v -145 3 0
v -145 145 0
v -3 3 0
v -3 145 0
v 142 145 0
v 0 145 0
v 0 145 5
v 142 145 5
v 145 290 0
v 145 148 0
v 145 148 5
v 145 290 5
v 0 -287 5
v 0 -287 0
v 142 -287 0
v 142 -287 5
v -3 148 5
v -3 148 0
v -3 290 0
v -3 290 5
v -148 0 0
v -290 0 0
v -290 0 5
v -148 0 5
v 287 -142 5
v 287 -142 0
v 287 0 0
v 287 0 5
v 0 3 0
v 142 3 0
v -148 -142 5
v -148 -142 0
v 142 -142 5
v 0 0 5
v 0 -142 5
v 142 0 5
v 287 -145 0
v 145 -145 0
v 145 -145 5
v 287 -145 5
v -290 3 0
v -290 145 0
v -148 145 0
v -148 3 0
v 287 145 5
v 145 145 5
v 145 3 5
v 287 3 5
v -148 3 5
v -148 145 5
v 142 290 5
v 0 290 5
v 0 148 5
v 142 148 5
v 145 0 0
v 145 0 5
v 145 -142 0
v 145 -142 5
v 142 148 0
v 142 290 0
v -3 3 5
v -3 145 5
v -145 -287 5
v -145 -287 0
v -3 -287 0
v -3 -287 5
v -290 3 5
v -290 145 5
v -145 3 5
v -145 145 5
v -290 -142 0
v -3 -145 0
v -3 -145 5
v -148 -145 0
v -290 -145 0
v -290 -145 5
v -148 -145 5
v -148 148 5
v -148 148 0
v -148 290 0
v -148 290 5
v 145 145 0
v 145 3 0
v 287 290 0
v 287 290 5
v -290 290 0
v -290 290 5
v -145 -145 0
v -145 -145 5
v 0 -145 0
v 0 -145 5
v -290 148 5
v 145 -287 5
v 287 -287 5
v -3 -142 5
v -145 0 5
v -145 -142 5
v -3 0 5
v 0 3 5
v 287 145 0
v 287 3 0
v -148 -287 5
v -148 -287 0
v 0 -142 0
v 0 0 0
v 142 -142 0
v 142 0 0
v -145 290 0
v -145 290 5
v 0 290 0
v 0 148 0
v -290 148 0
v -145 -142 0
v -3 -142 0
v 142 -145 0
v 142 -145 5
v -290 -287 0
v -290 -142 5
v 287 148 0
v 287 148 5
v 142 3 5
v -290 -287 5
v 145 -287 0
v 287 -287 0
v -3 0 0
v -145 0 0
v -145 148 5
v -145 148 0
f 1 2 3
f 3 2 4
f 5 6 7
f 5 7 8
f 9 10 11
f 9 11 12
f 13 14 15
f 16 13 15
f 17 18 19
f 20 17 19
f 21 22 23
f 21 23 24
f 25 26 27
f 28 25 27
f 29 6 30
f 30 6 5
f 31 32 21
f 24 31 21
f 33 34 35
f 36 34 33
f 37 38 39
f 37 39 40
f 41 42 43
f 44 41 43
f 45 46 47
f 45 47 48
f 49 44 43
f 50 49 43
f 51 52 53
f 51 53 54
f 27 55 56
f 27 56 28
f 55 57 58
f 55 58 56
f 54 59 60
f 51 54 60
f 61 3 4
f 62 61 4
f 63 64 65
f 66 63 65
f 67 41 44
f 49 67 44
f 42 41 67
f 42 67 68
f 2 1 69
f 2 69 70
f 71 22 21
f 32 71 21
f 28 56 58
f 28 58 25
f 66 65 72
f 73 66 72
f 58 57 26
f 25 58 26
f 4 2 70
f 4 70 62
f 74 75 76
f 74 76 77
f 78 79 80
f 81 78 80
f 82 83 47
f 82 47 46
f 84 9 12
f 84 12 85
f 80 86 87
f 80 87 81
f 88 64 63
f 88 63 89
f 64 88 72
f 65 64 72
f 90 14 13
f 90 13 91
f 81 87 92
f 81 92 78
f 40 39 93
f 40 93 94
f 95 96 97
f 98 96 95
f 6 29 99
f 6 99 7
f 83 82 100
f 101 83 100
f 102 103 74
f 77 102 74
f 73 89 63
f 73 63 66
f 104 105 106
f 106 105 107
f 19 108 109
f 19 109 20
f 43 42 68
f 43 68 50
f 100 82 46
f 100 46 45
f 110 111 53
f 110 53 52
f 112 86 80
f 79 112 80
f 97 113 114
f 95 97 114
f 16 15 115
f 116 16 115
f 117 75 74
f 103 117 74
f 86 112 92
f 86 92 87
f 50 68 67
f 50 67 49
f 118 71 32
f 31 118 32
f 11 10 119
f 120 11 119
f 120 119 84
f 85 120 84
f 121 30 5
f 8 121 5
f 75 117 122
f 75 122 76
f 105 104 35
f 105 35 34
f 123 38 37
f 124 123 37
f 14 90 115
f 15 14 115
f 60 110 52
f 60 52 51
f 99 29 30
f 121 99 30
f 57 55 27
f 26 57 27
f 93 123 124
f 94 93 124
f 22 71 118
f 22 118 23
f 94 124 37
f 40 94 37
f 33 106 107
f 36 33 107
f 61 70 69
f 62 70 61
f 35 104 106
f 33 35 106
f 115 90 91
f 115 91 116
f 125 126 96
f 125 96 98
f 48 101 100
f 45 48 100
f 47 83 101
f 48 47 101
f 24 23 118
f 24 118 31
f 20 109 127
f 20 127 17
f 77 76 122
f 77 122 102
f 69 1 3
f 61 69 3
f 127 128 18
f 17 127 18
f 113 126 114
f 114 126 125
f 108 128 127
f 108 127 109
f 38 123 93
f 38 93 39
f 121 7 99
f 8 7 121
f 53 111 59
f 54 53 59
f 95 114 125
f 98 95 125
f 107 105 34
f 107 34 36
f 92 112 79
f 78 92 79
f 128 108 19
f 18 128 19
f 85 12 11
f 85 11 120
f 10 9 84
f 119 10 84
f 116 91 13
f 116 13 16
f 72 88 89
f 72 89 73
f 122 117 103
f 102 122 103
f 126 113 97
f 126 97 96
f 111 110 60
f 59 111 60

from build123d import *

# Parameters (mm, degrees)
F0_W     = 142
F0_H     = 142
F1_DEPTH = 5


# Not quite as in the source:
# - a feature names something its author has since deleted; it is built from what else it names


with BuildPart() as f1:
    # F0 (on Top) → F1 (new body)
    with BuildSketch(Plane.XY):
        with Locations((-219, -216)):
            Rectangle(F0_W, F0_H)
    extrude(amount=F1_DEPTH)


with BuildPart() as f1b:
    # F0 (on Top) → F1, piece 2 (new body)
    with BuildSketch(Plane.XY):
        with Locations((-219, -71)):
            Rectangle(F0_W, F0_H)
    extrude(amount=F1_DEPTH)


with BuildPart() as f1c:
    # F0 (on Top) → F1, piece 3 (new body)
    with BuildSketch(Plane.XY):
        with Locations((-219, 74)):
            Rectangle(F0_W, F0_H)
    extrude(amount=F1_DEPTH)


with BuildPart() as f1d:
    # F0 (on Top) → F1, piece 4 (new body)
    with BuildSketch(Plane.XY):
        with Locations((-219, 219)):
            Rectangle(F0_W, F0_H)
    extrude(amount=F1_DEPTH)


with BuildPart() as f1e:
    # F0 (on Top) → F1, piece 5 (new body)
    with BuildSketch(Plane.XY):
        with Locations((-74, 219)):
            Rectangle(F0_W, F0_H)
    extrude(amount=F1_DEPTH)


with BuildPart() as f1f:
    # F0 (on Top) → F1, piece 6 (new body)
    with BuildSketch(Plane.XY):
        with Locations((71, 219)):
            Rectangle(F0_W, F0_H)
    extrude(amount=F1_DEPTH)


with BuildPart() as f1g:
    # F0 (on Top) → F1, piece 7 (new body)
    with BuildSketch(Plane.XY):
        with Locations((216, 219)):
            Rectangle(F0_W, F0_H)
    extrude(amount=F1_DEPTH)


with BuildPart() as f1h:
    # F0 (on Top) → F1, piece 8 (new body)
    with BuildSketch(Plane.XY):
        with Locations((216, -71)):
            Rectangle(F0_W, F0_H)
    extrude(amount=F1_DEPTH)


with BuildPart() as f1i:
    # F0 (on Top) → F1, piece 9 (new body)
    with BuildSketch(Plane.XY):
        with Locations((71, -71)):
            Rectangle(F0_W, F0_H)
    extrude(amount=F1_DEPTH)


with BuildPart() as f1j:
    # F0 (on Top) → F1, piece 10 (new body)
    with BuildSketch(Plane.XY):
        with Locations((71, -216)):
            Rectangle(F0_W, F0_H)
    extrude(amount=F1_DEPTH)


with BuildPart() as f1k:
    # F0 (on Top) → F1, piece 11 (new body)
    with BuildSketch(Plane.XY):
        with Locations((216, -216)):
            Rectangle(F0_W, F0_H)
    extrude(amount=F1_DEPTH)


with BuildPart() as f1l:
    # F0 (on Top) → F1, piece 12 (new body)
    with BuildSketch(Plane.XY):
        with Locations((216, 74)):
            Rectangle(F0_W, F0_H)
    extrude(amount=F1_DEPTH)


with BuildPart() as f1m:
    # F0 (on Top) → F1, piece 13 (new body)
    with BuildSketch(Plane.XY):
        with Locations((71, 74)):
            Rectangle(F0_W, F0_H)
    extrude(amount=F1_DEPTH)


with BuildPart() as f1n:
    # F0 (on Top) → F1, piece 14 (new body)
    with BuildSketch(Plane.XY):
        with Locations((-74, 74)):
            Rectangle(F0_W, F0_H)
    extrude(amount=F1_DEPTH)


with BuildPart() as f1o:
    # F0 (on Top) → F1, piece 15 (new body)
    with BuildSketch(Plane.XY):
        with Locations((-74, -71)):
            Rectangle(F0_W, F0_H)
    extrude(amount=F1_DEPTH)


with BuildPart() as f1p:
    # F0 (on Top) → F1, piece 16 (new body)
    with BuildSketch(Plane.XY):
        with Locations((-74, -216)):
            Rectangle(F0_W, F0_H)
    extrude(amount=F1_DEPTH)


solid = Compound([f1.part, f1b.part, f1c.part, f1d.part, f1e.part, f1f.part, f1g.part, f1h.part, f1i.part, f1j.part, f1k.part, f1l.part, f1m.part, f1n.part, f1o.part, f1p.part])
